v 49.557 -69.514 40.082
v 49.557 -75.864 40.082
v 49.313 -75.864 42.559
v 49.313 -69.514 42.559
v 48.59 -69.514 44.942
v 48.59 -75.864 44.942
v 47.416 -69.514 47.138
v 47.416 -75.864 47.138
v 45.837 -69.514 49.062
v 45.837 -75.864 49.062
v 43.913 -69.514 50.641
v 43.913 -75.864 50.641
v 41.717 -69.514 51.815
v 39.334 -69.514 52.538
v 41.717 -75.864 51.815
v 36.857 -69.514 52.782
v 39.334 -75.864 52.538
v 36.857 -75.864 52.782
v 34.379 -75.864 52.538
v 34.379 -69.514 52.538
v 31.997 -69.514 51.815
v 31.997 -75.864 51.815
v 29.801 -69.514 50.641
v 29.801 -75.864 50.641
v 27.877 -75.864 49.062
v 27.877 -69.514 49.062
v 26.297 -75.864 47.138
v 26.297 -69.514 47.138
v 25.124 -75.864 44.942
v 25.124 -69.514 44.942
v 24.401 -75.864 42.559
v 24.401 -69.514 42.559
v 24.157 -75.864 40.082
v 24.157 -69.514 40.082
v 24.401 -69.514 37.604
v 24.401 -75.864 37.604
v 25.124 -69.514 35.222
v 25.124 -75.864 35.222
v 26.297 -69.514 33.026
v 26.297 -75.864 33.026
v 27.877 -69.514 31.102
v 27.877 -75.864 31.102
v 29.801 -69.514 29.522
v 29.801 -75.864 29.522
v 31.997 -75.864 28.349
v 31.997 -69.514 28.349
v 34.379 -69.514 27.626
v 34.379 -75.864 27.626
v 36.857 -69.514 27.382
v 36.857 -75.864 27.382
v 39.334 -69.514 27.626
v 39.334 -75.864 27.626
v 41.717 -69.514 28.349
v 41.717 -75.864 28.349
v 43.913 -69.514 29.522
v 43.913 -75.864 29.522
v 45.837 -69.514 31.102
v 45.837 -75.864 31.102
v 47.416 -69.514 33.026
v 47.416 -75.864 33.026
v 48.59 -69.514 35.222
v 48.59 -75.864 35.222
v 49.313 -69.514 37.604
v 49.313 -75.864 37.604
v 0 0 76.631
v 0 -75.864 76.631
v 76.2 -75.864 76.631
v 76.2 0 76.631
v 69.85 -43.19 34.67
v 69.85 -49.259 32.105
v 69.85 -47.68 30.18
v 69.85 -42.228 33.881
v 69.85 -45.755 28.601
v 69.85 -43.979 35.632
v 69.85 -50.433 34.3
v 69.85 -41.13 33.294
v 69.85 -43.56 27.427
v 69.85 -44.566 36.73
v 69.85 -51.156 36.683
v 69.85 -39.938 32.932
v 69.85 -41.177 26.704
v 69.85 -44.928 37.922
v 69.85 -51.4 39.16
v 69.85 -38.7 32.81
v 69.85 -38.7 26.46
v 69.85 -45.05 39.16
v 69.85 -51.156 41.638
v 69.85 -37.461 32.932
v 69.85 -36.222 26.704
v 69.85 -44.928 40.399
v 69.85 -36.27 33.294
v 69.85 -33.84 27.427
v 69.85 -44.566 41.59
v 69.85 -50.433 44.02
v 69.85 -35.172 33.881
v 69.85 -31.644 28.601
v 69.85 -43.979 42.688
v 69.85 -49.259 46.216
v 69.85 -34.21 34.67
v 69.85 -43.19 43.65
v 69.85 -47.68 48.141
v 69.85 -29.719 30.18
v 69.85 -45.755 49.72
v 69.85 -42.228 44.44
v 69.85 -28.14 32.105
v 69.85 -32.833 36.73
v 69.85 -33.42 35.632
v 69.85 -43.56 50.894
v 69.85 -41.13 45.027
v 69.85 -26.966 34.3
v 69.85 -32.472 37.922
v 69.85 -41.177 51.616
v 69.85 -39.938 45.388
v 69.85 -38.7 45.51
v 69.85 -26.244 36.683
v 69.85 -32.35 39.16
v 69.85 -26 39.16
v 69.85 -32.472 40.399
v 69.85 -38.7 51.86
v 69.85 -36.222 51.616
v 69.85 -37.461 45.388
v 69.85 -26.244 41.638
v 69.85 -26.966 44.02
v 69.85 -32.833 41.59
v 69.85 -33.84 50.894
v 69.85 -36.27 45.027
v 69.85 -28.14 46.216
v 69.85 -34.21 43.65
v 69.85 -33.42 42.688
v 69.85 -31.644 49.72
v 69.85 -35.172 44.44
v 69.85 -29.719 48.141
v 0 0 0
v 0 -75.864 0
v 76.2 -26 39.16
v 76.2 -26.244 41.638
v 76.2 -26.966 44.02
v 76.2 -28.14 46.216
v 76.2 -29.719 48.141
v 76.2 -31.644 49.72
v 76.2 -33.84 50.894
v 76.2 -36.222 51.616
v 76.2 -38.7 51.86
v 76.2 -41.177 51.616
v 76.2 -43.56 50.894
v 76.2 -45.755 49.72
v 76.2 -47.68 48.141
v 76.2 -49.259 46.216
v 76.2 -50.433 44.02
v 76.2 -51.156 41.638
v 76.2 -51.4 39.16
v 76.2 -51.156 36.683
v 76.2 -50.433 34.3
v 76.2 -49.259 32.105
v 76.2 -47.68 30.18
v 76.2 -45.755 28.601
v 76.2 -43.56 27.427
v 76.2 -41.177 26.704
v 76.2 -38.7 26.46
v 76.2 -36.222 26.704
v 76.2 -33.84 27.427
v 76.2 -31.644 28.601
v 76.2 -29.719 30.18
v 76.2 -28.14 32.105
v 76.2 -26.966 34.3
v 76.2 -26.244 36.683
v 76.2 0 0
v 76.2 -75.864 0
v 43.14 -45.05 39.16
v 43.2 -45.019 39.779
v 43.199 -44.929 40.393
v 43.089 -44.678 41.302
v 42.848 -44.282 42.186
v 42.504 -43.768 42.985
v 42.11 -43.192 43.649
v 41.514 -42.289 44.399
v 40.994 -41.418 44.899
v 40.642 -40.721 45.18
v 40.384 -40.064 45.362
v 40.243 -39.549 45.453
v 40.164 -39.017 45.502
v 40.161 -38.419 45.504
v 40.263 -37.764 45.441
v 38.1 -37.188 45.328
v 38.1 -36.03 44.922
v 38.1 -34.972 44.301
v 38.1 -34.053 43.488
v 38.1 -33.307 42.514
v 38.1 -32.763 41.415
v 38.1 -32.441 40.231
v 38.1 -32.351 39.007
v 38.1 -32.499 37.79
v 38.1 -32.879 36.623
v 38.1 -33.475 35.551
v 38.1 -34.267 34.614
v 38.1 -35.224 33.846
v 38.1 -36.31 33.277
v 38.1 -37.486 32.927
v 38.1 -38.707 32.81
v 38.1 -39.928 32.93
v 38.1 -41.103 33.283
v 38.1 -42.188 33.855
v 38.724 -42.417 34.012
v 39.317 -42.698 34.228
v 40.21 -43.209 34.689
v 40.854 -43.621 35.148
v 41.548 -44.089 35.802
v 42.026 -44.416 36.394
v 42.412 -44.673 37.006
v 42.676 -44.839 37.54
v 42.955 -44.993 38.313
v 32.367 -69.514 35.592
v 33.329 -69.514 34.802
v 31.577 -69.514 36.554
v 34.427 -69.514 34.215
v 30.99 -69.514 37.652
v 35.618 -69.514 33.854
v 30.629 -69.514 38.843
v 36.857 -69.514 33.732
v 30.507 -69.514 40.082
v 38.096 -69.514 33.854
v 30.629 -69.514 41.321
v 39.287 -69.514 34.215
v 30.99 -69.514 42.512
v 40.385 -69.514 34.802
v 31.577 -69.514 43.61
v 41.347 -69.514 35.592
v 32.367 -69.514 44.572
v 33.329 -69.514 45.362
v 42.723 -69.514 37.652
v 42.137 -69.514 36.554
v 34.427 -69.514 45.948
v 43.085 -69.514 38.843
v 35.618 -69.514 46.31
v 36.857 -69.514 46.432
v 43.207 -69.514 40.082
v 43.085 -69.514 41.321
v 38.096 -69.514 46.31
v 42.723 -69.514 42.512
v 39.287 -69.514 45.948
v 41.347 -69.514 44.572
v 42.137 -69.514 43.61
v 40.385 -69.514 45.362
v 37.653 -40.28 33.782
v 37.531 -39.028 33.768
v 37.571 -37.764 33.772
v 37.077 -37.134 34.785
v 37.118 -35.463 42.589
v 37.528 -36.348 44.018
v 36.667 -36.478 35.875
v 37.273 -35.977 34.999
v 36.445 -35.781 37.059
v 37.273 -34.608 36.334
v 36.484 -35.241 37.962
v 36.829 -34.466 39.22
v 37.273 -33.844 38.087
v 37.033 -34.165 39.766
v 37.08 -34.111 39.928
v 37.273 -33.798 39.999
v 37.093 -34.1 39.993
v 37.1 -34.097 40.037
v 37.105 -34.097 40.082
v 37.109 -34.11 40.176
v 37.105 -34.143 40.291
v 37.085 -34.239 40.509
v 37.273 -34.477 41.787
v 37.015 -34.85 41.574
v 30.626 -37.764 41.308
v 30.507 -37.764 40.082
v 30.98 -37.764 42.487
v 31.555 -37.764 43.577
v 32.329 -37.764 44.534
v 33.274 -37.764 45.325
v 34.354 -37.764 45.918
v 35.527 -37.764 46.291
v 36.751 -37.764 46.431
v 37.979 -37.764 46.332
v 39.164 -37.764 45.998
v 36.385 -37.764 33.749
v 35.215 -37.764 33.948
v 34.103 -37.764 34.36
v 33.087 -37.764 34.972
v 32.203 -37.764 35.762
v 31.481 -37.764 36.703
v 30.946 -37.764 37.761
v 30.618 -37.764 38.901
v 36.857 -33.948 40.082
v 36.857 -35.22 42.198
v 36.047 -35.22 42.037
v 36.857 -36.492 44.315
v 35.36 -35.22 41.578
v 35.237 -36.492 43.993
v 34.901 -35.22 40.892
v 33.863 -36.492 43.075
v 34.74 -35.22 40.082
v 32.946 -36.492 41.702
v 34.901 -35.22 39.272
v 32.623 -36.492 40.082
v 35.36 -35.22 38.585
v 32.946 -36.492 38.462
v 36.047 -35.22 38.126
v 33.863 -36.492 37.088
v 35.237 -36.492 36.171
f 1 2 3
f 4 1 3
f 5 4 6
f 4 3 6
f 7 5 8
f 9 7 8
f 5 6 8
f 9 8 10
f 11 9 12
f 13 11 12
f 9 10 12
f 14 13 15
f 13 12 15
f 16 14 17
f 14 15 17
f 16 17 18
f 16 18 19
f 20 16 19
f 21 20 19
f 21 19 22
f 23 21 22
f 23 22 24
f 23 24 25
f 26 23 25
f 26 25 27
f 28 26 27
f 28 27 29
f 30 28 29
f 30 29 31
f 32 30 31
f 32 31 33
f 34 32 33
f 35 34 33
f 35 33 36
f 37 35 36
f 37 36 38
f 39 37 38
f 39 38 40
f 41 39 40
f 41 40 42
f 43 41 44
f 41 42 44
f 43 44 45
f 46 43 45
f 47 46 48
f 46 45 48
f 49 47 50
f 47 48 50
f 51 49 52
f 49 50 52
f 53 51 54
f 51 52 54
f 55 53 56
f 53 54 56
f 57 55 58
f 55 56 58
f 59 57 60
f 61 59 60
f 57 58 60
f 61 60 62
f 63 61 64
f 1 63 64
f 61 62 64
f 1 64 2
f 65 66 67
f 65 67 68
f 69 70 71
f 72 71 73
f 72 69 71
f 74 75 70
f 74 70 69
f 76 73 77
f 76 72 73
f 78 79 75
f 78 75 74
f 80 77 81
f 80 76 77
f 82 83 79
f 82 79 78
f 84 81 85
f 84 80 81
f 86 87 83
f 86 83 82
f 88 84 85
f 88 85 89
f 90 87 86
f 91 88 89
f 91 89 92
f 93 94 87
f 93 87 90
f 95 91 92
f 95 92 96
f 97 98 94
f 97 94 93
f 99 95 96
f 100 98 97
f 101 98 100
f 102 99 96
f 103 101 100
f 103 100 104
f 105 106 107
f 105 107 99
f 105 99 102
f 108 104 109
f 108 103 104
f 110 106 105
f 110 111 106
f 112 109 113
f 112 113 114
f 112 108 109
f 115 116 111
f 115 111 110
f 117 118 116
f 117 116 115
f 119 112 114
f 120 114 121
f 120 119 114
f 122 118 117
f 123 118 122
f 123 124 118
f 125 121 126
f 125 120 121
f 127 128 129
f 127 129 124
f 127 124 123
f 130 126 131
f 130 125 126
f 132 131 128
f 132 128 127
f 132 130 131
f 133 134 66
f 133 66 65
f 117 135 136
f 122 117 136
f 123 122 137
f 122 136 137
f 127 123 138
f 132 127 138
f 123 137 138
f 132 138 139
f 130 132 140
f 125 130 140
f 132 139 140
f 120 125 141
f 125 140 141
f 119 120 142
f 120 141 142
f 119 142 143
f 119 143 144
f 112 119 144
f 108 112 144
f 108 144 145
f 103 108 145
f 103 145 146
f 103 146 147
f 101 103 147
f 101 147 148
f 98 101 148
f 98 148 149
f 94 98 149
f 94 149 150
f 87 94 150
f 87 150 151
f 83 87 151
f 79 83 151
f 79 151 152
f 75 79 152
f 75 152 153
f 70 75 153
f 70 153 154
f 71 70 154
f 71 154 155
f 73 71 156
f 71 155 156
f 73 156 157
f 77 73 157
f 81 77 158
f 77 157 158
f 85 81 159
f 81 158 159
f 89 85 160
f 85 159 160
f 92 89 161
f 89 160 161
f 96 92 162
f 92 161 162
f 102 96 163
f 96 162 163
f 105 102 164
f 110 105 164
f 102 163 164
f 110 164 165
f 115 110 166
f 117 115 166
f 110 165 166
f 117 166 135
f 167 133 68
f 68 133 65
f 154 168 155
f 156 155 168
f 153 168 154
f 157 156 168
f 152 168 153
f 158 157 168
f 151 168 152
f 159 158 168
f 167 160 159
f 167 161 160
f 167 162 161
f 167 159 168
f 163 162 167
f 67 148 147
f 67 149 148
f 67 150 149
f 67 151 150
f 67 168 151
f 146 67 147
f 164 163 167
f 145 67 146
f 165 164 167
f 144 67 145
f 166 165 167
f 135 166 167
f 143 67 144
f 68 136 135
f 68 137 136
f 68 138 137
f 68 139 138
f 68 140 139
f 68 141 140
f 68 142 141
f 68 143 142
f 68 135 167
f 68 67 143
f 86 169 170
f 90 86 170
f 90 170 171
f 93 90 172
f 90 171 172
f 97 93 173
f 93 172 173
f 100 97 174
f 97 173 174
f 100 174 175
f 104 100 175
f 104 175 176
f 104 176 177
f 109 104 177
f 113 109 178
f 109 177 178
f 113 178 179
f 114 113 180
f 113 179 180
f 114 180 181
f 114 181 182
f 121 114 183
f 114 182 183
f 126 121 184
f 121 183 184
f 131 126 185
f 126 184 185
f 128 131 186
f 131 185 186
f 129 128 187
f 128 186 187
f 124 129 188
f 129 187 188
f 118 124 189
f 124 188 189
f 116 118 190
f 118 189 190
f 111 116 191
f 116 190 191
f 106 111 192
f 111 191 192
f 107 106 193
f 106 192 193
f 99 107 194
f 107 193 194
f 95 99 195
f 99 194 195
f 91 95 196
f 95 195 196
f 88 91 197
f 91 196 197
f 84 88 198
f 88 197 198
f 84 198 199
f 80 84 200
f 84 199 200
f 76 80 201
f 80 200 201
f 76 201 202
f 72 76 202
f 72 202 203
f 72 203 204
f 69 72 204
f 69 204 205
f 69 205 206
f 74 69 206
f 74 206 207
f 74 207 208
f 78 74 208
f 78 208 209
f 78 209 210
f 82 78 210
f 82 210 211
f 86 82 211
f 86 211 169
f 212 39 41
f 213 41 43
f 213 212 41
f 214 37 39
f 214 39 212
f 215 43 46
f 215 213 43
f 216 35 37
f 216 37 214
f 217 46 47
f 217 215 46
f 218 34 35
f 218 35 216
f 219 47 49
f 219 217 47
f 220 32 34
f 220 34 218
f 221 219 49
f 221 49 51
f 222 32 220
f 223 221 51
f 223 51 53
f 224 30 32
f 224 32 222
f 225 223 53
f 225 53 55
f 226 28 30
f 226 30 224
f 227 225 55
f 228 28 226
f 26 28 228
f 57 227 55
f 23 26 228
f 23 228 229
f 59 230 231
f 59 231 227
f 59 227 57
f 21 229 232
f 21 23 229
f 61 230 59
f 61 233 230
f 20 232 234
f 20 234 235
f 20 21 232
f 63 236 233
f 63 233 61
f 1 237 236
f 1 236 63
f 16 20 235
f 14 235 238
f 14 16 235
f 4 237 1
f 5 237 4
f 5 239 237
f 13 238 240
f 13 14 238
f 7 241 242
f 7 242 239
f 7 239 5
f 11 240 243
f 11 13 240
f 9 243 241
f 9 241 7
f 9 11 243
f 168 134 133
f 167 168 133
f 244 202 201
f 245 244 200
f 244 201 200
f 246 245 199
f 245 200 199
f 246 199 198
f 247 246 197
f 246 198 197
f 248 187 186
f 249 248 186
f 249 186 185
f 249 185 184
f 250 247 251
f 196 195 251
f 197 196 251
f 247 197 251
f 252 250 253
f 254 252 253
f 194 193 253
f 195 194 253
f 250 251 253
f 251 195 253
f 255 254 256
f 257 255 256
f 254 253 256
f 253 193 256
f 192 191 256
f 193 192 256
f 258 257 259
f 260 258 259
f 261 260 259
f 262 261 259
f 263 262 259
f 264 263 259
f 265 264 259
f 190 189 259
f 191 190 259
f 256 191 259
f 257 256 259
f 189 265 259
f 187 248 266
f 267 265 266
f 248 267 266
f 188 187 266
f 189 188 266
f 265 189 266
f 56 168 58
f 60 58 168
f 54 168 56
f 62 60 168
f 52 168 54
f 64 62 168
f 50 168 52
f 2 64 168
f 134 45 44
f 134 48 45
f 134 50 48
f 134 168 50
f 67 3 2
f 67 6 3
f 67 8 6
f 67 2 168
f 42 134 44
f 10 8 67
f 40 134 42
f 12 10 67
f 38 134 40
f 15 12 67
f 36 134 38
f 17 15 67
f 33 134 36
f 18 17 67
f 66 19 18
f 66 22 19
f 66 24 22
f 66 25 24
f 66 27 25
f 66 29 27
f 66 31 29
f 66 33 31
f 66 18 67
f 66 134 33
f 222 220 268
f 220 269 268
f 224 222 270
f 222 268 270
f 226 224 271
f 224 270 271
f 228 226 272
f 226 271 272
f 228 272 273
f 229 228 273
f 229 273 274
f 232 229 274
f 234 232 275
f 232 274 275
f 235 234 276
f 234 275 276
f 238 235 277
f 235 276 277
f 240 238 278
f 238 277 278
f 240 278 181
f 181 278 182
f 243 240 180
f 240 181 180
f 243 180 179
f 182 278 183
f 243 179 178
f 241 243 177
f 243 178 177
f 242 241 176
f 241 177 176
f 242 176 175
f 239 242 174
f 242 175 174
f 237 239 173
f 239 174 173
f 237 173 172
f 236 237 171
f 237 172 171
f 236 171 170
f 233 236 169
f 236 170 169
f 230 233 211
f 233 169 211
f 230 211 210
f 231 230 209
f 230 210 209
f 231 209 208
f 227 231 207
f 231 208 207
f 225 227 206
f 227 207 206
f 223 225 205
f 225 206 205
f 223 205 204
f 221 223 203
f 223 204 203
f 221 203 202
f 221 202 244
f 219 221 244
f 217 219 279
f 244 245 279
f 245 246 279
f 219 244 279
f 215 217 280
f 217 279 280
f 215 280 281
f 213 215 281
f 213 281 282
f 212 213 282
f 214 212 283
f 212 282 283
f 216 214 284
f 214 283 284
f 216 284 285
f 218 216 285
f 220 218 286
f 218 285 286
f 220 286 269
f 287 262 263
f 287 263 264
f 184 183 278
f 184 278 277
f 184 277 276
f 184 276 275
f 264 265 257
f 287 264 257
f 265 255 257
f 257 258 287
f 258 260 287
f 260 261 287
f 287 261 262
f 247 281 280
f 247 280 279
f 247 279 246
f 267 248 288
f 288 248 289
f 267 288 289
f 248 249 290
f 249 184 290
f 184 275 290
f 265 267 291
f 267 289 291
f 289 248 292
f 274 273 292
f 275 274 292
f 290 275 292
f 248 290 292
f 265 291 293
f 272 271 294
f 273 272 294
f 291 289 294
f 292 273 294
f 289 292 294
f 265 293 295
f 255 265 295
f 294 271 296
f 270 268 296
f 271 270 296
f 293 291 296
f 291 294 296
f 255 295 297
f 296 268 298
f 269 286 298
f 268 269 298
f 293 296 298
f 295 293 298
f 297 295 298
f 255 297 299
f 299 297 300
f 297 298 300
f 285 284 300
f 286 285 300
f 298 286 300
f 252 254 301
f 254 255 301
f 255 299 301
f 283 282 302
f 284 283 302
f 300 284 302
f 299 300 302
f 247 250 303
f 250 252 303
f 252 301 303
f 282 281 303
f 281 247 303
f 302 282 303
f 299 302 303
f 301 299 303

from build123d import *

# Parameters (mm, degrees)
F0_W           = 75.8636072278
F0_H           = 76.6314566135
F1_DEPTH       = 76.2
F3_D           = 12.7
F3_DEPTH       = 38.1
F3_CBORE_D     = 25.4
F3_CBORE_DEPTH = 6.35
F3_TIP         = 3.8154649308
F5_D           = 12.7
F5_DEPTH       = 38.1
F5_CBORE_D     = 25.4
F5_CBORE_DEPTH = 6.35
F5_TIP         = 3.8154649308


with BuildPart() as f1:
    # F0 (on Right) → F1 (new body)
    with BuildSketch(Plane.YZ):
        with Locations((-37.9318036139, 38.3157283068)):
            Rectangle(F0_W, F0_H)
    extrude(amount=F1_DEPTH)

    # F3
    with Locations(Plane.XZ.offset(75.8636072278)):
        with Locations((36.8568152189, 40.0817841291)):
            CounterBoreHole(F3_D / 2, F3_CBORE_D / 2, F3_CBORE_DEPTH, depth=F3_DEPTH)
            with Locations((0, 0, -(F3_DEPTH + F3_TIP / 2))):  # 118° drill point
                Cone(0, F3_D / 2, F3_TIP, mode=Mode.SUBTRACT)

    # F5
    with Locations(Plane.YZ.offset(76.2)):
        with Locations((-38.6996529996, 39.1603671014)):
            CounterBoreHole(F5_D / 2, F5_CBORE_D / 2, F5_CBORE_DEPTH, depth=F5_DEPTH)
            with Locations((0, 0, -(F5_DEPTH + F5_TIP / 2))):  # 118° drill point
                Cone(0, F5_D / 2, F5_TIP, mode=Mode.SUBTRACT)


solid = f1.part
